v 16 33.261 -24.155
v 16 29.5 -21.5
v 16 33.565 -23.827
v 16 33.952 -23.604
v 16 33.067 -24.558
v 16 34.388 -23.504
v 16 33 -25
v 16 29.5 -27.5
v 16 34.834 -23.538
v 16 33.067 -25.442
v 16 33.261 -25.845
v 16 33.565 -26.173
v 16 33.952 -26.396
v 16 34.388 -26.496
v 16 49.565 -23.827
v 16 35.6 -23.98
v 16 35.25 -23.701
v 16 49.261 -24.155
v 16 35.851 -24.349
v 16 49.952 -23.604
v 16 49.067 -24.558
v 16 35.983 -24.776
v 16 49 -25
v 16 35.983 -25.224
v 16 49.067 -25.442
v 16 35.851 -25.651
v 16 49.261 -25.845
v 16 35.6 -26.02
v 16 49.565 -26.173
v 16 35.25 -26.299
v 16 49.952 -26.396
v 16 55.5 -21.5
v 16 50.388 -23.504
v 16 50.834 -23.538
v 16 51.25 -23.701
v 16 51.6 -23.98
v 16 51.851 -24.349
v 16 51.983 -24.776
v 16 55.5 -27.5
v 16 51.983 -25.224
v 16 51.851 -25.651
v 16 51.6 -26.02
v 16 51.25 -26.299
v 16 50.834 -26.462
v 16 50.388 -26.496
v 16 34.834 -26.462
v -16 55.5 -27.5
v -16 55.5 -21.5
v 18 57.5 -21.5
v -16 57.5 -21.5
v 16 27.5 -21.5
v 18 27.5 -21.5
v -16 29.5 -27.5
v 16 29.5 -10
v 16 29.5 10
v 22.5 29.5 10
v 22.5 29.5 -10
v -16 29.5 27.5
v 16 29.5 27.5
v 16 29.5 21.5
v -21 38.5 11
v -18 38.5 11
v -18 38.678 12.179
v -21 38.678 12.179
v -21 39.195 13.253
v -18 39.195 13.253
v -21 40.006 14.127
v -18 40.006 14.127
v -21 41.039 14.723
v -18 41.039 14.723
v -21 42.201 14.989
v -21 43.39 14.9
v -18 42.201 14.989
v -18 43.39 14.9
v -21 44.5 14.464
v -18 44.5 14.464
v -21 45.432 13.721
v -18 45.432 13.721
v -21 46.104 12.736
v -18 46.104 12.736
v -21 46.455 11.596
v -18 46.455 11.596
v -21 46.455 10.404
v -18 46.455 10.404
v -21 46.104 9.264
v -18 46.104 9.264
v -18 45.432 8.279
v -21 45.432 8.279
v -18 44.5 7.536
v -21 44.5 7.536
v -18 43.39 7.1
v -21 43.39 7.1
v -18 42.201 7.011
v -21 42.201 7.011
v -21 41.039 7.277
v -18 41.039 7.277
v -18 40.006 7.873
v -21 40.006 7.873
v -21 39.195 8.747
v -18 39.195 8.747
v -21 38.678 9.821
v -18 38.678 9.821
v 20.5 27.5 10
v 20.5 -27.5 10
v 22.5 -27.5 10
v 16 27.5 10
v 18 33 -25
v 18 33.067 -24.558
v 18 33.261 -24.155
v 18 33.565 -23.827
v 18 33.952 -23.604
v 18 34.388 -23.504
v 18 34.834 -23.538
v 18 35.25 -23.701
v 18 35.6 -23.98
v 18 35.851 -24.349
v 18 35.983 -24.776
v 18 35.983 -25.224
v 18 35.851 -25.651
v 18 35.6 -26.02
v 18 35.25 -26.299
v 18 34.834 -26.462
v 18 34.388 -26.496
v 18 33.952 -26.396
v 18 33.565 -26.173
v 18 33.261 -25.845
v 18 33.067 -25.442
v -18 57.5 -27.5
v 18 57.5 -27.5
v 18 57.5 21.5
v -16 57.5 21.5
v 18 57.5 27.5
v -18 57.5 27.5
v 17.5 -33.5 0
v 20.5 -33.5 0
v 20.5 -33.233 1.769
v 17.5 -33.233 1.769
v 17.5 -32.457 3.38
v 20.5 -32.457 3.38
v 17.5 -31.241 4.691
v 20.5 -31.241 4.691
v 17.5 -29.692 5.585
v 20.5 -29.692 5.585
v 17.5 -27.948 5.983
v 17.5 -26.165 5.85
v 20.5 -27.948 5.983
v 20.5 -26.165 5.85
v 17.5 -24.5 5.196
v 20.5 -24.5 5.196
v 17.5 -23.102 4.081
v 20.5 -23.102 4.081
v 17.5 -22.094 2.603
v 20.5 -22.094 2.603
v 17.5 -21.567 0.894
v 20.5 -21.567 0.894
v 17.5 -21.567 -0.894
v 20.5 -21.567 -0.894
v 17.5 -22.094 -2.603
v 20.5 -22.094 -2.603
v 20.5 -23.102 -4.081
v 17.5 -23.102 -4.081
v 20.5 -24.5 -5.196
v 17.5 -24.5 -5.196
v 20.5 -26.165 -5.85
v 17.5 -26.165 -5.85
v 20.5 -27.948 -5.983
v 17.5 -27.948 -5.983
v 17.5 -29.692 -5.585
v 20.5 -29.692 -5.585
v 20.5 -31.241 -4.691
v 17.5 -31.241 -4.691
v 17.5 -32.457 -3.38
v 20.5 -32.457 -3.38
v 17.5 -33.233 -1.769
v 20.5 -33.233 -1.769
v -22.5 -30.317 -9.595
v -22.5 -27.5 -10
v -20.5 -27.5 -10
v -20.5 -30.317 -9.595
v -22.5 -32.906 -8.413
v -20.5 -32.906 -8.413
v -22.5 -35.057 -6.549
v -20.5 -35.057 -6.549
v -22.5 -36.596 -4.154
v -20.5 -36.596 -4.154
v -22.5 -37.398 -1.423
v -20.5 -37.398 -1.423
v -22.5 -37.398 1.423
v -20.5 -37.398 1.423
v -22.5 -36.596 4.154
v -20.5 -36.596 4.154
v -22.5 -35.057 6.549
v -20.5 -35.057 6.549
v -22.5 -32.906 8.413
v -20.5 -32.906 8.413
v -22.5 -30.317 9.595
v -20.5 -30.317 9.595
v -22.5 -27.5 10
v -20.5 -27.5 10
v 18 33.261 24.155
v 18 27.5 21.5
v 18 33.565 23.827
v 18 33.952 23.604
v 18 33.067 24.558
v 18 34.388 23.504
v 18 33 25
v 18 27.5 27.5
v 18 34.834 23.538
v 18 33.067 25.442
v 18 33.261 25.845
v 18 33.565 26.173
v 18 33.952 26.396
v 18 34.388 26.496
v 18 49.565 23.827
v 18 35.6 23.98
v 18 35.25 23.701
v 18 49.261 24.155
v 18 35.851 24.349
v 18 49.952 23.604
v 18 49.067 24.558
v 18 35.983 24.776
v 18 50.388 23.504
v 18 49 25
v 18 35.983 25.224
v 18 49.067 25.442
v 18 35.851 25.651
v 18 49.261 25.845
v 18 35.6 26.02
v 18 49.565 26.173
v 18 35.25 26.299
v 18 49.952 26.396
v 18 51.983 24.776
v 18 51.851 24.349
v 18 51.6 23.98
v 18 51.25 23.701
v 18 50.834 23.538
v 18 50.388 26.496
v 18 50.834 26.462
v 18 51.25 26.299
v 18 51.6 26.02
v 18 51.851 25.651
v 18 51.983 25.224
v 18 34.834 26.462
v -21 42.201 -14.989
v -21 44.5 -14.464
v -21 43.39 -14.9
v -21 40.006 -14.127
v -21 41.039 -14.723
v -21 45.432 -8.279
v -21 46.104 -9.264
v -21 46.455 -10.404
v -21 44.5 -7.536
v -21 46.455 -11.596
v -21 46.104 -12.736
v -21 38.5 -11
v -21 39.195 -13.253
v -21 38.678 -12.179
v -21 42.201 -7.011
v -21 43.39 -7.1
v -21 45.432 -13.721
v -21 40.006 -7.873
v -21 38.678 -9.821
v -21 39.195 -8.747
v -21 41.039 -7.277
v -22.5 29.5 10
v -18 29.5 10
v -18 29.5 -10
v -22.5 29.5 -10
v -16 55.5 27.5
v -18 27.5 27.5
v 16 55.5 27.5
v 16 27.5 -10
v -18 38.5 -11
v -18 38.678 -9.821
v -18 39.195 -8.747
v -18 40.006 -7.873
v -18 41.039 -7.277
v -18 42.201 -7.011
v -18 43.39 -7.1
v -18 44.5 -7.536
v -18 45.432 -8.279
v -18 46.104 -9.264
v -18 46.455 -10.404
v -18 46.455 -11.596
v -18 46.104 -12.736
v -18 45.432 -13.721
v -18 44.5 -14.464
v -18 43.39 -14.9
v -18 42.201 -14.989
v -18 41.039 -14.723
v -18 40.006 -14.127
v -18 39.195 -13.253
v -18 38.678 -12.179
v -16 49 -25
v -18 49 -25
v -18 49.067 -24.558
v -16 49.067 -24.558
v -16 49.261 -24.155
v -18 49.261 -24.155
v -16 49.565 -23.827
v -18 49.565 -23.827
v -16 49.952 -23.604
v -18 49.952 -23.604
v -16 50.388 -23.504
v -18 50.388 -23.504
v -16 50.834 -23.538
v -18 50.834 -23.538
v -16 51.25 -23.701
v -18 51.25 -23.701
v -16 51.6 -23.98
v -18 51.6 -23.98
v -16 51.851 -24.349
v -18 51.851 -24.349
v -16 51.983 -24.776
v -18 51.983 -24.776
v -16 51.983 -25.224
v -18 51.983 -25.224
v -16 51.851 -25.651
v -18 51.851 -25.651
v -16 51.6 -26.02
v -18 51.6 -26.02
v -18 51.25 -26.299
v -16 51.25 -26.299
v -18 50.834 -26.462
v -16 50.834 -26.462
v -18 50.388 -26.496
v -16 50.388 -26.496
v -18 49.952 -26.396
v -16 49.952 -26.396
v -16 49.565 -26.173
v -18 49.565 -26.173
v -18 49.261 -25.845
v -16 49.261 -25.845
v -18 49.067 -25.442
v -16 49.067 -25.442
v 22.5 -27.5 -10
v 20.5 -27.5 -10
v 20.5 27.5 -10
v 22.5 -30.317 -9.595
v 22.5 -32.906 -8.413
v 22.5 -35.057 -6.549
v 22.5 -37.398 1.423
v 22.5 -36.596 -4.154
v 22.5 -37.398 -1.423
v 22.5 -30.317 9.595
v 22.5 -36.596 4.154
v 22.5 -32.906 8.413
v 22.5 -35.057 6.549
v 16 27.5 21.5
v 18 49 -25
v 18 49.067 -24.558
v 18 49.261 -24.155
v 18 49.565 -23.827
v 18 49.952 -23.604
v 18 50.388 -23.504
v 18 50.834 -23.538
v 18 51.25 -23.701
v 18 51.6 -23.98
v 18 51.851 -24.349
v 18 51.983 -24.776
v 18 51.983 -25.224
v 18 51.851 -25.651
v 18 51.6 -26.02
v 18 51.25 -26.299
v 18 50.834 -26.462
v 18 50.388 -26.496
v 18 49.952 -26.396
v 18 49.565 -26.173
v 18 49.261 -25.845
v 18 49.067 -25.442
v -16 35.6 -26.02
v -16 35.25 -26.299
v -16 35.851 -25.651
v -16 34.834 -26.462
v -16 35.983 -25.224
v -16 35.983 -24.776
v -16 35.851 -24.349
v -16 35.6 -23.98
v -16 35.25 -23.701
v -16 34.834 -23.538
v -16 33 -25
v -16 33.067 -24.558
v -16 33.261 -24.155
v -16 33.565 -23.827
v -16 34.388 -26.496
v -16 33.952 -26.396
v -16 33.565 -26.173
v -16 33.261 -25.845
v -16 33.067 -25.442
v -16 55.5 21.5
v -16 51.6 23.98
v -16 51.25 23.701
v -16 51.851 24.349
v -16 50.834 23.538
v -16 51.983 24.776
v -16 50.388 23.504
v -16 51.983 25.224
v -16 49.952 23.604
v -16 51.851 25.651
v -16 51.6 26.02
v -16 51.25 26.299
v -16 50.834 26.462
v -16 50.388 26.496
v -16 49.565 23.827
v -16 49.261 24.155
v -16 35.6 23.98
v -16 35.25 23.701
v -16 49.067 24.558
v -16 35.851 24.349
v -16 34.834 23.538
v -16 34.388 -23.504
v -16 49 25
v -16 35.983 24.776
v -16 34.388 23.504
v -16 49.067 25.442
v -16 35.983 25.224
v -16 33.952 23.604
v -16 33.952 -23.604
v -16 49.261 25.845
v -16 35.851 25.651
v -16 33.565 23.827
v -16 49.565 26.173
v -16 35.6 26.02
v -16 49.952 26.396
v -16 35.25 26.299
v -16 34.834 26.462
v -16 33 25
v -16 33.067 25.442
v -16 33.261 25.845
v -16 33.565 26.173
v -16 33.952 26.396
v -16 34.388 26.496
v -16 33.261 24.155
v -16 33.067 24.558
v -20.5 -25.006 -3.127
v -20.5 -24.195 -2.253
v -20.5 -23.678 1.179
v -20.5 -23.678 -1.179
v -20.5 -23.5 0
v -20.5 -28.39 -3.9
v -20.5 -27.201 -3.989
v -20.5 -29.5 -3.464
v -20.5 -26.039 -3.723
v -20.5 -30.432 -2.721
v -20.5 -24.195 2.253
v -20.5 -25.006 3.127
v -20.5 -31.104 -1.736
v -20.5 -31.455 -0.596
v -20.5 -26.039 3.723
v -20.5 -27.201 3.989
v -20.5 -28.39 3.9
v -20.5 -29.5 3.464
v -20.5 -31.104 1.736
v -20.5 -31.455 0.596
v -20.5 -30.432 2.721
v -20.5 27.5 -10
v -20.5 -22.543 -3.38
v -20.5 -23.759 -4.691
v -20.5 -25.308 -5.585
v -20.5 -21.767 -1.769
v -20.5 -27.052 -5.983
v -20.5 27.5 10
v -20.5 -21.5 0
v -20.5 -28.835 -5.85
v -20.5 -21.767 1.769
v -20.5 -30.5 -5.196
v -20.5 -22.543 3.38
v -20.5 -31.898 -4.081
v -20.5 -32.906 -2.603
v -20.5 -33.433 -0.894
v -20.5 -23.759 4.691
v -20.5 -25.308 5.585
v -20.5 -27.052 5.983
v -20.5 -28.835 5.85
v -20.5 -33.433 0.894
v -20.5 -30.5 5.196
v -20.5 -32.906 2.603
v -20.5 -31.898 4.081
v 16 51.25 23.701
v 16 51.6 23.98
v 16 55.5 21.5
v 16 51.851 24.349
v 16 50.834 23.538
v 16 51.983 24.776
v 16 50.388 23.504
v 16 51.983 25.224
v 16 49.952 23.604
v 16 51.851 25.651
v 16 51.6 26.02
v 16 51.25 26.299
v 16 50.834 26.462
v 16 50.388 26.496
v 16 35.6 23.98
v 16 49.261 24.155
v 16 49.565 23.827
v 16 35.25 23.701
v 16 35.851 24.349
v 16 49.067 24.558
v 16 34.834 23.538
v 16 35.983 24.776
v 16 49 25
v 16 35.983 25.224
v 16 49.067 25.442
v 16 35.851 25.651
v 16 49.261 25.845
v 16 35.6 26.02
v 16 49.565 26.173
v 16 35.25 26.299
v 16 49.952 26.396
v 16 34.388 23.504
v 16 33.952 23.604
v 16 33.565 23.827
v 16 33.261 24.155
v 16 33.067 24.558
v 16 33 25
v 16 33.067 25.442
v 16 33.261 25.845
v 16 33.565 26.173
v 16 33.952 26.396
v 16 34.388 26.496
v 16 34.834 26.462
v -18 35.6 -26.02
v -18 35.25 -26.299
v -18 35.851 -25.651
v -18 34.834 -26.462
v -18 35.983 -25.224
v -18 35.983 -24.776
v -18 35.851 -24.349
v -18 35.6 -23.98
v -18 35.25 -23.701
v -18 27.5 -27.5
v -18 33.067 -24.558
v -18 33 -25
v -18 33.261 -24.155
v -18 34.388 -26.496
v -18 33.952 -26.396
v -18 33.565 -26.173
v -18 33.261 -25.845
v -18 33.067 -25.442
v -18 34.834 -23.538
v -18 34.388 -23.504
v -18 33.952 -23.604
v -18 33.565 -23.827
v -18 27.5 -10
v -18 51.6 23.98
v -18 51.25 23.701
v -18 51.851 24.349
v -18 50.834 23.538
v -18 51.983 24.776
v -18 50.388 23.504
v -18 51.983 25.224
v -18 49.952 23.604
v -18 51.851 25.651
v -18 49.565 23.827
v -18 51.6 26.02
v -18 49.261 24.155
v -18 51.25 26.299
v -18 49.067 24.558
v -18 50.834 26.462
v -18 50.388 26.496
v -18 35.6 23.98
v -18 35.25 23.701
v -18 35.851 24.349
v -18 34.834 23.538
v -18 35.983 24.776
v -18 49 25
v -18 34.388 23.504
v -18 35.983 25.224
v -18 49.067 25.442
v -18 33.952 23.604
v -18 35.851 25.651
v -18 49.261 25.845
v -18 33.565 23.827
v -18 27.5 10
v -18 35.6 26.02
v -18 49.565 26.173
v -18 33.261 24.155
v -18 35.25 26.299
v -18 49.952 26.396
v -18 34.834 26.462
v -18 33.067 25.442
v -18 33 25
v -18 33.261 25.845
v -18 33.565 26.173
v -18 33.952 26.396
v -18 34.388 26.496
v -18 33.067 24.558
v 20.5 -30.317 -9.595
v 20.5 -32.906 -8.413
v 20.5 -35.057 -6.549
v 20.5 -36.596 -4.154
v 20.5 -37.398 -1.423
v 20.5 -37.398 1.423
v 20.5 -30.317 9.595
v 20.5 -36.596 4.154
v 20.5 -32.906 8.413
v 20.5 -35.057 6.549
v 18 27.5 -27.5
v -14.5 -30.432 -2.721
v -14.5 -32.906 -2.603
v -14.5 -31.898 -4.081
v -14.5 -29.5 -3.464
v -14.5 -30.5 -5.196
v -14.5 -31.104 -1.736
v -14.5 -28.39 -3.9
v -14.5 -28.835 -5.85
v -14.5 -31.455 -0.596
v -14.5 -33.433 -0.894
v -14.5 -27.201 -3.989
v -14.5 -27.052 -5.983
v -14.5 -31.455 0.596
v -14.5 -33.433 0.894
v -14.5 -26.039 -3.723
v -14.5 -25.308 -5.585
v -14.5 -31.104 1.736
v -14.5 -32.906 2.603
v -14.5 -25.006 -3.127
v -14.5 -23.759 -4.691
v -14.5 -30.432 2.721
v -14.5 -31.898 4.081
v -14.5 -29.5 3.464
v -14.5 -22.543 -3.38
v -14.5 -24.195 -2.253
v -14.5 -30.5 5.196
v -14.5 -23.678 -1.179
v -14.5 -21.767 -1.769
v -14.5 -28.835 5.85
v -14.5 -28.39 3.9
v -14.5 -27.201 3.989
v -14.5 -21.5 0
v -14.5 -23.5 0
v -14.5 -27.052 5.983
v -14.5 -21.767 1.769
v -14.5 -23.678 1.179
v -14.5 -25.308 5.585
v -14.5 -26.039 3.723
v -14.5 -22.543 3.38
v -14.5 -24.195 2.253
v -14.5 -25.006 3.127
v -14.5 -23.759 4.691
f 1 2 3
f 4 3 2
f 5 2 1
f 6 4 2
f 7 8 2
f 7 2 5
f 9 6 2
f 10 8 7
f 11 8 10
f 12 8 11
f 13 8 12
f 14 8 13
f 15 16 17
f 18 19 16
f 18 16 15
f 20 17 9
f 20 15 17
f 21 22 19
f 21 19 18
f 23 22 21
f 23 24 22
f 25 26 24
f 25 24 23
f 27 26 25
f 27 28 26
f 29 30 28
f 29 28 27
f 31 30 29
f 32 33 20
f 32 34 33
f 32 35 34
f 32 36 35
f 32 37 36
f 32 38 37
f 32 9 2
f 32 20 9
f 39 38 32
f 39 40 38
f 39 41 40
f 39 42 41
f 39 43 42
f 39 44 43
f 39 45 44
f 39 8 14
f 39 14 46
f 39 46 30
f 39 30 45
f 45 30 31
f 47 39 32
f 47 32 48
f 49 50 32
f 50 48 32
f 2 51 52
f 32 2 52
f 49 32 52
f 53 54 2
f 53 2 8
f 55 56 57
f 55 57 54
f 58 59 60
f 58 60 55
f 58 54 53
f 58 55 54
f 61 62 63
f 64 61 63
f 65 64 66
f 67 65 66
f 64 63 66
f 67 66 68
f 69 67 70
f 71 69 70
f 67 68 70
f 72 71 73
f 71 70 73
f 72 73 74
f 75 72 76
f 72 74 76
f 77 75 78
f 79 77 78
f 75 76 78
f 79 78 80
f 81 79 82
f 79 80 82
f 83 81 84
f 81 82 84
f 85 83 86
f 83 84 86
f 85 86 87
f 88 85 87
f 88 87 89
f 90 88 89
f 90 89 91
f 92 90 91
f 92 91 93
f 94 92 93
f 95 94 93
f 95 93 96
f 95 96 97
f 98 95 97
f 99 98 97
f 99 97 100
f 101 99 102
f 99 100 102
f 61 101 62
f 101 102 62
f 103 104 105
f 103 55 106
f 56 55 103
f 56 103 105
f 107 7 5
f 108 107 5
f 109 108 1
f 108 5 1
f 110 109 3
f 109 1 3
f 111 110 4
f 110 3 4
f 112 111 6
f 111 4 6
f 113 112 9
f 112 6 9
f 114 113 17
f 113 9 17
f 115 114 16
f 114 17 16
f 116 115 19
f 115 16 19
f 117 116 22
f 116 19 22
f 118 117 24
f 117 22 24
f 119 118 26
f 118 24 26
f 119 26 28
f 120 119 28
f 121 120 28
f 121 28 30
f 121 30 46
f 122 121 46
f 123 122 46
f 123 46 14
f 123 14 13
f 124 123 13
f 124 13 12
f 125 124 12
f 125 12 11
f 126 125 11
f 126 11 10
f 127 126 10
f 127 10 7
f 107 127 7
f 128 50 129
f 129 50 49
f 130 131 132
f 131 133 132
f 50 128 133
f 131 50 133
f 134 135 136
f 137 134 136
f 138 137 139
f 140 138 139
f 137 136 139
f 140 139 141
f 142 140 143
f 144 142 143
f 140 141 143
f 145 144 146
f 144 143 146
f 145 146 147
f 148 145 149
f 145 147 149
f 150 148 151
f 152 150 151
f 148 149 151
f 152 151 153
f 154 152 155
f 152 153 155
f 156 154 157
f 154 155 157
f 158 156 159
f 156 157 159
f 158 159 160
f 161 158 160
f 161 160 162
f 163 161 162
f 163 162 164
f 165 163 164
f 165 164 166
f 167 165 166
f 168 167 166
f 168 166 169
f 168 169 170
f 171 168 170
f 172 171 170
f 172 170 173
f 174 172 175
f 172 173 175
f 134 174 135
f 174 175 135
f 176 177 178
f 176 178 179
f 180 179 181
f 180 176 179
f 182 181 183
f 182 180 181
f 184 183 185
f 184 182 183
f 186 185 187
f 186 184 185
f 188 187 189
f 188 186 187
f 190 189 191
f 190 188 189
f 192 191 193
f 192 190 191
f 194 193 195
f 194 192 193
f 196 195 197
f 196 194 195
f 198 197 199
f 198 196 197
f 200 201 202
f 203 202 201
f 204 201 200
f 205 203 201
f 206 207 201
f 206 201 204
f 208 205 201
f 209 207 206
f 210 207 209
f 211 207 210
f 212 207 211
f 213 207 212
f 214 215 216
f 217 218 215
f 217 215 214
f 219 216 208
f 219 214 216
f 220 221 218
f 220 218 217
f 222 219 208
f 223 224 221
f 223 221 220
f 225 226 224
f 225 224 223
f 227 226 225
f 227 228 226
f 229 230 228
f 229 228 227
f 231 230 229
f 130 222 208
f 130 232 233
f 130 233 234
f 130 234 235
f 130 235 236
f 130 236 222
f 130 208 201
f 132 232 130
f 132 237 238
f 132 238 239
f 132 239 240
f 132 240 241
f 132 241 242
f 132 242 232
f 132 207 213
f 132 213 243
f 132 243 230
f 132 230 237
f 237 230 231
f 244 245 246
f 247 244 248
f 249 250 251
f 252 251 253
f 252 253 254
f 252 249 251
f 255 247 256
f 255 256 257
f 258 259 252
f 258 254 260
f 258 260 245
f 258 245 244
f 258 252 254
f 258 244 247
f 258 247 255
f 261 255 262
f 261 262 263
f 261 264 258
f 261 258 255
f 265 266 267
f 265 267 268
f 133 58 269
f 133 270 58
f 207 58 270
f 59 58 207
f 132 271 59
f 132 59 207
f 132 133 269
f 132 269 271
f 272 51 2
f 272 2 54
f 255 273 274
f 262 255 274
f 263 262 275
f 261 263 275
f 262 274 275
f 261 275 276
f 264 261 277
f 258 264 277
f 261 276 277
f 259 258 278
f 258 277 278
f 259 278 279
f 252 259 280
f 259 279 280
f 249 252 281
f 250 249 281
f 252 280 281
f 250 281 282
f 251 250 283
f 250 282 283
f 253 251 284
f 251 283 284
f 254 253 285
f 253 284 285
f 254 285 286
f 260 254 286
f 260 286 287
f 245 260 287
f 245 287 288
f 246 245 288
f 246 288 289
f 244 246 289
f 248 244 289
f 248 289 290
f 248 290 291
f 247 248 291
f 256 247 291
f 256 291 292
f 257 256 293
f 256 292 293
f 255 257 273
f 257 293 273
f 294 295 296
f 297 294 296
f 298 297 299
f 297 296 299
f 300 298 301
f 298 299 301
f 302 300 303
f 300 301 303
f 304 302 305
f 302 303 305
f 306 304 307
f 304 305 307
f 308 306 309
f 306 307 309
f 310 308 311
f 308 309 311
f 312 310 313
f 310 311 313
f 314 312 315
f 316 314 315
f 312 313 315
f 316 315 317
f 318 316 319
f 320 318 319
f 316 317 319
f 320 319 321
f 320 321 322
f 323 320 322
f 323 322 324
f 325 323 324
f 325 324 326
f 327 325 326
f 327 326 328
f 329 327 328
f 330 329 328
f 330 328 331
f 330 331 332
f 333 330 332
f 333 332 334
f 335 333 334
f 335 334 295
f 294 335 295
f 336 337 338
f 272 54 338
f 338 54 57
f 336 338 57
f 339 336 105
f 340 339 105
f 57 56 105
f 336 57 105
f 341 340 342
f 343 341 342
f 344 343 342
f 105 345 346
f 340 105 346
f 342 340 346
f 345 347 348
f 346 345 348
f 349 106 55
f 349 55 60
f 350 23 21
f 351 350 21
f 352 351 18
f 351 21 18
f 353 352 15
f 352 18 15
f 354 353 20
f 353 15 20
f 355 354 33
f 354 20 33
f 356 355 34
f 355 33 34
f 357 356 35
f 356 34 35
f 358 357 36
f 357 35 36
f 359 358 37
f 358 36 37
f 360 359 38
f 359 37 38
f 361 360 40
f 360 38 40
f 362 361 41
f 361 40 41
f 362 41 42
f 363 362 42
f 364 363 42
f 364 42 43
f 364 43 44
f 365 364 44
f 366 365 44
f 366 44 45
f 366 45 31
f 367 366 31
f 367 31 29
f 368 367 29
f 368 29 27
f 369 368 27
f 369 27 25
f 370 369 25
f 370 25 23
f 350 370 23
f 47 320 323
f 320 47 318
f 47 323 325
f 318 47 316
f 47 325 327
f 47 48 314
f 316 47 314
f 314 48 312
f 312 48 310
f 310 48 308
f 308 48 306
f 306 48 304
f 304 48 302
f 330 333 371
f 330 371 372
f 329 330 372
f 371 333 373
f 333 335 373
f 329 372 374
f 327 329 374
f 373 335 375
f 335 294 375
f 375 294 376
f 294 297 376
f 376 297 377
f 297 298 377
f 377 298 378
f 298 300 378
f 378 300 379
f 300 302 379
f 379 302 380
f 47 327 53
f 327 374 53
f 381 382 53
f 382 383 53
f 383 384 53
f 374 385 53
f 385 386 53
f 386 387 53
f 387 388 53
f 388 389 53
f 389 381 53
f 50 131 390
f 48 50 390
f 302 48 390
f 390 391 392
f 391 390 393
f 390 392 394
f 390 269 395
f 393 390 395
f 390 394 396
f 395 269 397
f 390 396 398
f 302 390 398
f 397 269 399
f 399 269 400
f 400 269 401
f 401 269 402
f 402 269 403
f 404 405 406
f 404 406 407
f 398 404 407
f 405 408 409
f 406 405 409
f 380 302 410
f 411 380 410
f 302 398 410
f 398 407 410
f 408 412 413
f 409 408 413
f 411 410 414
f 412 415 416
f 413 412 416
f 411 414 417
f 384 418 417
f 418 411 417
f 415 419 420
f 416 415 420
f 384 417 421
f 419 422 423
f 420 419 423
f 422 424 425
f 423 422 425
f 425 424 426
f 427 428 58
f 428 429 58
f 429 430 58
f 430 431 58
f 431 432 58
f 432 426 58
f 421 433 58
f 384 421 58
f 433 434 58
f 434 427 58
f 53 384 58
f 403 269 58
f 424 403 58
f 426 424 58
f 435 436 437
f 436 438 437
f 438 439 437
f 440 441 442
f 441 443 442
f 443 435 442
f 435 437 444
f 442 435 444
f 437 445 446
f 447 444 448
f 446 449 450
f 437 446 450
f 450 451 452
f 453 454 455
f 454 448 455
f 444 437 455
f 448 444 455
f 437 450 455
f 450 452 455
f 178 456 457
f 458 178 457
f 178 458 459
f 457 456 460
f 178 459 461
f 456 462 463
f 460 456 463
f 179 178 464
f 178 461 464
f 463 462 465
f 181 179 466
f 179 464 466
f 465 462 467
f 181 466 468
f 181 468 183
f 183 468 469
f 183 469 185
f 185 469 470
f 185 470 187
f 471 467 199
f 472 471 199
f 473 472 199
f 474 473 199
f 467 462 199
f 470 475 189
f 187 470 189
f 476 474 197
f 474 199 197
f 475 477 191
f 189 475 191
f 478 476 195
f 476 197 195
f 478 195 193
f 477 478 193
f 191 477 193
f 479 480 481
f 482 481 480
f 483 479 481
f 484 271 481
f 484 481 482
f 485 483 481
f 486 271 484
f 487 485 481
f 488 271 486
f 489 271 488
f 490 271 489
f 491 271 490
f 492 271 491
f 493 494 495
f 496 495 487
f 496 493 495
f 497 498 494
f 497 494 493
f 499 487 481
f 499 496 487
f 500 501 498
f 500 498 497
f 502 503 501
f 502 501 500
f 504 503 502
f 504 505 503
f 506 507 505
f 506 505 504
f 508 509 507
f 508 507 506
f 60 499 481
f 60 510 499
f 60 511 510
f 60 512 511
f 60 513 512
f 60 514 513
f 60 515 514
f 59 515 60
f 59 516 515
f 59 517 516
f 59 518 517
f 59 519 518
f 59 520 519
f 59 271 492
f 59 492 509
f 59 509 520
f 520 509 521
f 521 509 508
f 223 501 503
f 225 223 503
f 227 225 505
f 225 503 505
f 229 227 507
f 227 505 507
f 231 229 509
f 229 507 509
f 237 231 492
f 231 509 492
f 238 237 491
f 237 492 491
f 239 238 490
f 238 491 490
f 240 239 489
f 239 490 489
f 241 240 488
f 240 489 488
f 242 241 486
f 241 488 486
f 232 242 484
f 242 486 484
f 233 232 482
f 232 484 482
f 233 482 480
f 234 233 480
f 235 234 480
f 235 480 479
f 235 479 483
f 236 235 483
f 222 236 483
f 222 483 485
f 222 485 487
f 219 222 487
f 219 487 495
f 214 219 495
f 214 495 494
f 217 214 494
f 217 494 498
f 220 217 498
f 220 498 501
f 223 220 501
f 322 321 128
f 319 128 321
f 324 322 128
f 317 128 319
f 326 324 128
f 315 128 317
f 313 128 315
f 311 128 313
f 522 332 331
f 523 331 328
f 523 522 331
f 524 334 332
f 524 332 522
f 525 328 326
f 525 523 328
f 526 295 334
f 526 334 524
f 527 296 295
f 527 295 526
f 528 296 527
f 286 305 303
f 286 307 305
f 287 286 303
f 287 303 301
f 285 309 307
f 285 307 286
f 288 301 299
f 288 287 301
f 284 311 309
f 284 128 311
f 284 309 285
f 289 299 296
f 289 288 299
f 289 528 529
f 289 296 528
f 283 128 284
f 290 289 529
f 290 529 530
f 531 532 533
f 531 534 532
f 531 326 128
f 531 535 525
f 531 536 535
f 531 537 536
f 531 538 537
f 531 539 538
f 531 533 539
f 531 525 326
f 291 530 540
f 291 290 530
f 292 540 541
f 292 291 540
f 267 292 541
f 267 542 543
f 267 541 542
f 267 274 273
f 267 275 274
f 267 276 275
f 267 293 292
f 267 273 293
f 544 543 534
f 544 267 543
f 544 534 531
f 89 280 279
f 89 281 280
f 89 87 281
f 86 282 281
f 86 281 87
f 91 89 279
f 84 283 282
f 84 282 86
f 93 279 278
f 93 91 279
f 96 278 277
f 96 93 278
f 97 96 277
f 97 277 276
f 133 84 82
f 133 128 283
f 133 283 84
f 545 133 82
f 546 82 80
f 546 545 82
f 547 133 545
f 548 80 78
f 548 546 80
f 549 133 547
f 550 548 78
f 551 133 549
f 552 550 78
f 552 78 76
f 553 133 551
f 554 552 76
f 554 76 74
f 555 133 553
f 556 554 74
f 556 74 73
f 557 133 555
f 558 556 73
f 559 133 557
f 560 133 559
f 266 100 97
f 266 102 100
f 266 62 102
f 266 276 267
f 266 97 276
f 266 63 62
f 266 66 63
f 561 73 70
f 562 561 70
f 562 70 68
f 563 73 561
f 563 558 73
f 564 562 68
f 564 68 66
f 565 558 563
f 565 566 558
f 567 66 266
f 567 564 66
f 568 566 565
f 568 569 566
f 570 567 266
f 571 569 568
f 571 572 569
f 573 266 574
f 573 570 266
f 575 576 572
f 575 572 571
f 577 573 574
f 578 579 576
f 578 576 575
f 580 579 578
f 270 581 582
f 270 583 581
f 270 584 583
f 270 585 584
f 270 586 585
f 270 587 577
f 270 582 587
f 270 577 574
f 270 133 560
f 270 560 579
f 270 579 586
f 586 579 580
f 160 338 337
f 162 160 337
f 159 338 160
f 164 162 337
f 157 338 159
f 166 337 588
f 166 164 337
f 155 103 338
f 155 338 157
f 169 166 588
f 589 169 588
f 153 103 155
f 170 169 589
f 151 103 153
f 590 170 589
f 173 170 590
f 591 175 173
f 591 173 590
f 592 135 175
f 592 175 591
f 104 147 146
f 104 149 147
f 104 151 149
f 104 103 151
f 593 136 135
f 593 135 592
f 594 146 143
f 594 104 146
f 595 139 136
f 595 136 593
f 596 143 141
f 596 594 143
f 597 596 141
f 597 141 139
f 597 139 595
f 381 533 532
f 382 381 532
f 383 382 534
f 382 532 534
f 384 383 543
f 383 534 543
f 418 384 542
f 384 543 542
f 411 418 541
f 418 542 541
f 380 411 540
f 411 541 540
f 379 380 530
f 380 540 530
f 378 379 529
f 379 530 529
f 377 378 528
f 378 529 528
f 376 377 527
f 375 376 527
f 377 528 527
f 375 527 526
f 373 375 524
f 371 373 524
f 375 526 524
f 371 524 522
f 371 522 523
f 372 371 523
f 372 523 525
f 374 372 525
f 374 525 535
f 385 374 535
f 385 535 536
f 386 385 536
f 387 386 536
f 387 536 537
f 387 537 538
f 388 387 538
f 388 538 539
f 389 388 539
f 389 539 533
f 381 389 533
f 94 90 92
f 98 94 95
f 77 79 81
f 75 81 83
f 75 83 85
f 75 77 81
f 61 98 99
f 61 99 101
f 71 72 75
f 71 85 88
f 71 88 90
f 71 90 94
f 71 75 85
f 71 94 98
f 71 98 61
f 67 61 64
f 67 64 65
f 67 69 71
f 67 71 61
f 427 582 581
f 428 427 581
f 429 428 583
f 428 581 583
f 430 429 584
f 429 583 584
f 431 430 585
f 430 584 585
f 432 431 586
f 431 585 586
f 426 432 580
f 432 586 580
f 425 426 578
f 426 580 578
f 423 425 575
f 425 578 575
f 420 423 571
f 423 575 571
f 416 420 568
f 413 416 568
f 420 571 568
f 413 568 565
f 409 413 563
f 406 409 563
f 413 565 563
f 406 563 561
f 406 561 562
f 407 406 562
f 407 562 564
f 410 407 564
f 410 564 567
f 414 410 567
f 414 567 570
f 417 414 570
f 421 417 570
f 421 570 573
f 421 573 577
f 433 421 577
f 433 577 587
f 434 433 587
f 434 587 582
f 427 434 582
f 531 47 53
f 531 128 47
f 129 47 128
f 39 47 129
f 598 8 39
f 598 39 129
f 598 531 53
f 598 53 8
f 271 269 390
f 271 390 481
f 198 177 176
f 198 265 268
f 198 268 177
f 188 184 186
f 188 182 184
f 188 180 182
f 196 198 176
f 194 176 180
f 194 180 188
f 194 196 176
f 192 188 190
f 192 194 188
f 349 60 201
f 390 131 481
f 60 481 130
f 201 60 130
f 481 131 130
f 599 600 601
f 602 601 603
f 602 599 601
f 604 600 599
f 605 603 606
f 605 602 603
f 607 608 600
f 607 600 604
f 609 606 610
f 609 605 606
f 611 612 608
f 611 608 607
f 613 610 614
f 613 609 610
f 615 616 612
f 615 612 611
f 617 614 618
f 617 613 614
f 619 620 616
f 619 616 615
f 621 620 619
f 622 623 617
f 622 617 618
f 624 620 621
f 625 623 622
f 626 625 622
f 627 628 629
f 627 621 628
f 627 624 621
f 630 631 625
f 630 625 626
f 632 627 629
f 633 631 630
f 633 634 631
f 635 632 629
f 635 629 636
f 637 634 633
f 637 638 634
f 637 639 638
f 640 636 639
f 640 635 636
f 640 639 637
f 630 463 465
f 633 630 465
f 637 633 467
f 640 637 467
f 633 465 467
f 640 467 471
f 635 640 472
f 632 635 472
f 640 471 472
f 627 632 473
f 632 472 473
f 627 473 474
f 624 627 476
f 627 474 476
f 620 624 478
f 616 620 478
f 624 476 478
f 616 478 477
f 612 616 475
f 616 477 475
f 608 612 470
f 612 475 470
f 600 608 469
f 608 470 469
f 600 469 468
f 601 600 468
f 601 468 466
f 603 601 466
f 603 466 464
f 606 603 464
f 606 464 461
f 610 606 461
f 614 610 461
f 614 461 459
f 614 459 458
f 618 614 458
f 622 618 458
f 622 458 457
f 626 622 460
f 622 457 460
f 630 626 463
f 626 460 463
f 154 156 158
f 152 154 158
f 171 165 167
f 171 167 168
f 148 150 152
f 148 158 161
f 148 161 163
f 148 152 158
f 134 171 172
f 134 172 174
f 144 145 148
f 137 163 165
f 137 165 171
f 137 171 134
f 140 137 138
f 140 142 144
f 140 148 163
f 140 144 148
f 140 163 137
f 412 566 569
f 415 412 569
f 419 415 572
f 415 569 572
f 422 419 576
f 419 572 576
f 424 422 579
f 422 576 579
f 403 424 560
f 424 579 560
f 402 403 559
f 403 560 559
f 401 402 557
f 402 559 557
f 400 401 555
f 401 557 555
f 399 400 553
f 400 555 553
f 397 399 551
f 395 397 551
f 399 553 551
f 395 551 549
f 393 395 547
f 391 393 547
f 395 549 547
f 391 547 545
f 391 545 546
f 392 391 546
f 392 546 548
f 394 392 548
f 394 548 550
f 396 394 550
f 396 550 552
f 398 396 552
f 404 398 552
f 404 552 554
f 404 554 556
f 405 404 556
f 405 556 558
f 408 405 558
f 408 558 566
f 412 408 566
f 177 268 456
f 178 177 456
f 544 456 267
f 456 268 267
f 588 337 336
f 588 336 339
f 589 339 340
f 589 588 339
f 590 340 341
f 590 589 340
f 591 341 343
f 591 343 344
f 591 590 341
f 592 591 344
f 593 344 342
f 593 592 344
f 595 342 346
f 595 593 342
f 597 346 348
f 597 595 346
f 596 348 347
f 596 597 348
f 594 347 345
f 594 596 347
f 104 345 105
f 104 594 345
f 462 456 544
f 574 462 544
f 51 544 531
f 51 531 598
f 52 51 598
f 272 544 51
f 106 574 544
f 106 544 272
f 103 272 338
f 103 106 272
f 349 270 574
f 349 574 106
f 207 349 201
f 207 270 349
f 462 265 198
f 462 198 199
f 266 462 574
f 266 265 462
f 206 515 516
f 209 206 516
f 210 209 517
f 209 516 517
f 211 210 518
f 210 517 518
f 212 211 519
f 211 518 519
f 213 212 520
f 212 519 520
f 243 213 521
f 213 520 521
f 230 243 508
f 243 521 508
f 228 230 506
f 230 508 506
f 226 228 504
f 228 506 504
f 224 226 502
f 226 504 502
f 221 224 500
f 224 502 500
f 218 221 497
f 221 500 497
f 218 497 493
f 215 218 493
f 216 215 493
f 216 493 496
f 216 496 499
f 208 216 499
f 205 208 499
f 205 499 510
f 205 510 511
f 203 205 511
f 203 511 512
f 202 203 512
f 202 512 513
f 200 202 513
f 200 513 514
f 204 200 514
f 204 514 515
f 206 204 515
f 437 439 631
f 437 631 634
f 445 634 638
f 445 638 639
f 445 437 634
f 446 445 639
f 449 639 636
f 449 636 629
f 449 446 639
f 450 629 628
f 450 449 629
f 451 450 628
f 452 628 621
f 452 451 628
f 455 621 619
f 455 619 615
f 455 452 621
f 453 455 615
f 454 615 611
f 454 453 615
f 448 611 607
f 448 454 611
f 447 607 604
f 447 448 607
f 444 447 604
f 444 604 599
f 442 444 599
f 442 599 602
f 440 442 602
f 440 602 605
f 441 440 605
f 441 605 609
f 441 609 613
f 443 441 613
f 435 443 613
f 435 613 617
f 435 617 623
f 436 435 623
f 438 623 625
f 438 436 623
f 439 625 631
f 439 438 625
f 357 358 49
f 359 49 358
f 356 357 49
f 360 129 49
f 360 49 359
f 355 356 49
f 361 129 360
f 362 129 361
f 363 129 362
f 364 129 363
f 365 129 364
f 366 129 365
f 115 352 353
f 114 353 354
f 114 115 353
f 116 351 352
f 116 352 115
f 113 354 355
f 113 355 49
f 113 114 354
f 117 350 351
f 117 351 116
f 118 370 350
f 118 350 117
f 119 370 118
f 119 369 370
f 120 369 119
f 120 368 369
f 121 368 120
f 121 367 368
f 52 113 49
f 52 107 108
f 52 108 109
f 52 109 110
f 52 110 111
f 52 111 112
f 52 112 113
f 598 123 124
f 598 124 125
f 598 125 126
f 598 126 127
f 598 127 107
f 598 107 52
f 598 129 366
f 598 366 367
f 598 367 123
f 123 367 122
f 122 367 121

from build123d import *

# Parameters (mm, degrees)
F1_DEPTH  = 10
F2_R      = 10
F3_DEPTH  = 2
F5_DEPTH  = 2
F6_R      = 6
F6_R_2    = 4
F7_DEPTH  = 6
F8_R      = 6
F9_DEPTH  = 3
F10_W     = 32
F10_H     = 17.5
F11_DEPTH = 2
F13_DEPTH = 6
F15_DEPTH = 6
F16_R     = 1.5
F17_DEPTH = 50.8
F18_R     = 1.5
F19_DEPTH = 50.8
F20_W     = 2
F20_H     = 30
F21_DEPTH = 43
F22_R     = 4
F23_DEPTH = 3


with BuildPart() as f1:
    # F0 (on Top) → F1 (new body, symmetric)
    with BuildSketch(Plane.XY):
        Polygon((22.5, -27.5), (22.5, 29.5), (-22.5, 29.5), (-22.5, -27.5), (-20.5, -27.5), (-20.5, 27.5), (20.5, 27.5), (20.5, -27.5), align=None)
    extrude(amount=F1_DEPTH, both=True)

    # F2 (on face) → F3 (join)
    with BuildSketch(Plane(origin=(-22.5, 0, 0), x_dir=(0, -1, 0), z_dir=(-1, 0, 0))):
        with Locations((27.5, 0)):
            Circle(F2_R)
    extrude(amount=-F3_DEPTH)

    # F4 (on face) → F5 (join)
    with BuildSketch(Plane(origin=(20.5, 0, 0), x_dir=(0, -1, 0), z_dir=(-1, 0, 0))):
        with BuildLine():
            Line((27.5, 10), (27.5, -10))
            ThreePointArc((27.5, -10), (37.5, 0), (27.5, 10))
        make_face()
    extrude(amount=-F5_DEPTH)

    # F6 (on face) → F7 (join)
    with BuildSketch(Plane.YZ.offset(-20.5)):
        with Locations((-27.5, 0)):
            Circle(F6_R)
        with Locations((-27.5, 0)):
            Circle(F6_R_2, mode=Mode.SUBTRACT)
    extrude(amount=F7_DEPTH)

    # F8 (on face) → F9 (join)
    with BuildSketch(Plane(origin=(20.5, 0, 0), x_dir=(0, -1, 0), z_dir=(-1, 0, 0))):
        with Locations((27.5, 0)):
            Circle(F8_R)
    extrude(amount=F9_DEPTH)

    # F10 (on face) → F11 (join)
    with BuildSketch(Plane.XZ.offset(-27.5)):
        with Locations((0, -18.75)):
            Rectangle(F10_W, F10_H)
        with Locations((0, 18.75)):
            Rectangle(F10_W, F10_H)
    extrude(amount=-F11_DEPTH)

    # F12 (on face) → F13 (join)
    with BuildSketch(Plane(origin=(0, 0, -27.5), x_dir=(1, 0, 0), z_dir=(0, 0, -1))):
        Polygon((18, -57.5), (18, -27.5), (16, -27.5), (16, -29.5), (16, -55.5), (-16, -55.5), (-16, -29.5), (-16, -27.5), (-18, -27.5), (-18, -57.5), align=None)
    extrude(amount=-F13_DEPTH)

    # F14 (on face) → F15 (join)
    with BuildSketch(Plane.XY.offset(27.5)):
        Polygon((-16, 27.5), (-16, 55.5), (16, 55.5), (16, 27.5), (18, 27.5), (18, 57.5), (-18, 57.5), (-18, 27.5), align=None)
    extrude(amount=-F15_DEPTH)

    # F16 (on face) → F17 (cut)
    with BuildSketch(Plane(origin=(-18, 0, 0), x_dir=(0, -1, 0), z_dir=(-1, 0, 0))):
        with Locations((-50.5, 25)):
            Circle(F16_R)
        with Locations((-34.5, 25)):
            Circle(F16_R)
    extrude(amount=-F17_DEPTH, mode=Mode.SUBTRACT)

    # F18 (on face) → F19 (cut)
    with BuildSketch(Plane(origin=(-18, 0, 0), x_dir=(0, -1, 0), z_dir=(-1, 0, 0))):
        with Locations((-50.5, -25)):
            Circle(F18_R)
        with Locations((-34.5, -25)):
            Circle(F18_R)
    extrude(amount=-F19_DEPTH, mode=Mode.SUBTRACT)

    # F20 (on face) → F21 (join)
    with BuildSketch(Plane(origin=(0, 0, 21.5), x_dir=(1, 0, 0), z_dir=(0, 0, -1))):
        with Locations((-17, -42.5)):
            Rectangle(F20_W, F20_H)
    extrude(amount=F21_DEPTH)

    # F22 (on face) → F23 (join)
    with BuildSketch(Plane(origin=(-18, 0, 0), x_dir=(0, -1, 0), z_dir=(-1, 0, 0))):
        with Locations((-42.5, 11)):
            Circle(F22_R)
        with Locations((-42.5, -11)):
            Circle(F22_R)
    extrude(amount=F23_DEPTH)


solid = f1.part
